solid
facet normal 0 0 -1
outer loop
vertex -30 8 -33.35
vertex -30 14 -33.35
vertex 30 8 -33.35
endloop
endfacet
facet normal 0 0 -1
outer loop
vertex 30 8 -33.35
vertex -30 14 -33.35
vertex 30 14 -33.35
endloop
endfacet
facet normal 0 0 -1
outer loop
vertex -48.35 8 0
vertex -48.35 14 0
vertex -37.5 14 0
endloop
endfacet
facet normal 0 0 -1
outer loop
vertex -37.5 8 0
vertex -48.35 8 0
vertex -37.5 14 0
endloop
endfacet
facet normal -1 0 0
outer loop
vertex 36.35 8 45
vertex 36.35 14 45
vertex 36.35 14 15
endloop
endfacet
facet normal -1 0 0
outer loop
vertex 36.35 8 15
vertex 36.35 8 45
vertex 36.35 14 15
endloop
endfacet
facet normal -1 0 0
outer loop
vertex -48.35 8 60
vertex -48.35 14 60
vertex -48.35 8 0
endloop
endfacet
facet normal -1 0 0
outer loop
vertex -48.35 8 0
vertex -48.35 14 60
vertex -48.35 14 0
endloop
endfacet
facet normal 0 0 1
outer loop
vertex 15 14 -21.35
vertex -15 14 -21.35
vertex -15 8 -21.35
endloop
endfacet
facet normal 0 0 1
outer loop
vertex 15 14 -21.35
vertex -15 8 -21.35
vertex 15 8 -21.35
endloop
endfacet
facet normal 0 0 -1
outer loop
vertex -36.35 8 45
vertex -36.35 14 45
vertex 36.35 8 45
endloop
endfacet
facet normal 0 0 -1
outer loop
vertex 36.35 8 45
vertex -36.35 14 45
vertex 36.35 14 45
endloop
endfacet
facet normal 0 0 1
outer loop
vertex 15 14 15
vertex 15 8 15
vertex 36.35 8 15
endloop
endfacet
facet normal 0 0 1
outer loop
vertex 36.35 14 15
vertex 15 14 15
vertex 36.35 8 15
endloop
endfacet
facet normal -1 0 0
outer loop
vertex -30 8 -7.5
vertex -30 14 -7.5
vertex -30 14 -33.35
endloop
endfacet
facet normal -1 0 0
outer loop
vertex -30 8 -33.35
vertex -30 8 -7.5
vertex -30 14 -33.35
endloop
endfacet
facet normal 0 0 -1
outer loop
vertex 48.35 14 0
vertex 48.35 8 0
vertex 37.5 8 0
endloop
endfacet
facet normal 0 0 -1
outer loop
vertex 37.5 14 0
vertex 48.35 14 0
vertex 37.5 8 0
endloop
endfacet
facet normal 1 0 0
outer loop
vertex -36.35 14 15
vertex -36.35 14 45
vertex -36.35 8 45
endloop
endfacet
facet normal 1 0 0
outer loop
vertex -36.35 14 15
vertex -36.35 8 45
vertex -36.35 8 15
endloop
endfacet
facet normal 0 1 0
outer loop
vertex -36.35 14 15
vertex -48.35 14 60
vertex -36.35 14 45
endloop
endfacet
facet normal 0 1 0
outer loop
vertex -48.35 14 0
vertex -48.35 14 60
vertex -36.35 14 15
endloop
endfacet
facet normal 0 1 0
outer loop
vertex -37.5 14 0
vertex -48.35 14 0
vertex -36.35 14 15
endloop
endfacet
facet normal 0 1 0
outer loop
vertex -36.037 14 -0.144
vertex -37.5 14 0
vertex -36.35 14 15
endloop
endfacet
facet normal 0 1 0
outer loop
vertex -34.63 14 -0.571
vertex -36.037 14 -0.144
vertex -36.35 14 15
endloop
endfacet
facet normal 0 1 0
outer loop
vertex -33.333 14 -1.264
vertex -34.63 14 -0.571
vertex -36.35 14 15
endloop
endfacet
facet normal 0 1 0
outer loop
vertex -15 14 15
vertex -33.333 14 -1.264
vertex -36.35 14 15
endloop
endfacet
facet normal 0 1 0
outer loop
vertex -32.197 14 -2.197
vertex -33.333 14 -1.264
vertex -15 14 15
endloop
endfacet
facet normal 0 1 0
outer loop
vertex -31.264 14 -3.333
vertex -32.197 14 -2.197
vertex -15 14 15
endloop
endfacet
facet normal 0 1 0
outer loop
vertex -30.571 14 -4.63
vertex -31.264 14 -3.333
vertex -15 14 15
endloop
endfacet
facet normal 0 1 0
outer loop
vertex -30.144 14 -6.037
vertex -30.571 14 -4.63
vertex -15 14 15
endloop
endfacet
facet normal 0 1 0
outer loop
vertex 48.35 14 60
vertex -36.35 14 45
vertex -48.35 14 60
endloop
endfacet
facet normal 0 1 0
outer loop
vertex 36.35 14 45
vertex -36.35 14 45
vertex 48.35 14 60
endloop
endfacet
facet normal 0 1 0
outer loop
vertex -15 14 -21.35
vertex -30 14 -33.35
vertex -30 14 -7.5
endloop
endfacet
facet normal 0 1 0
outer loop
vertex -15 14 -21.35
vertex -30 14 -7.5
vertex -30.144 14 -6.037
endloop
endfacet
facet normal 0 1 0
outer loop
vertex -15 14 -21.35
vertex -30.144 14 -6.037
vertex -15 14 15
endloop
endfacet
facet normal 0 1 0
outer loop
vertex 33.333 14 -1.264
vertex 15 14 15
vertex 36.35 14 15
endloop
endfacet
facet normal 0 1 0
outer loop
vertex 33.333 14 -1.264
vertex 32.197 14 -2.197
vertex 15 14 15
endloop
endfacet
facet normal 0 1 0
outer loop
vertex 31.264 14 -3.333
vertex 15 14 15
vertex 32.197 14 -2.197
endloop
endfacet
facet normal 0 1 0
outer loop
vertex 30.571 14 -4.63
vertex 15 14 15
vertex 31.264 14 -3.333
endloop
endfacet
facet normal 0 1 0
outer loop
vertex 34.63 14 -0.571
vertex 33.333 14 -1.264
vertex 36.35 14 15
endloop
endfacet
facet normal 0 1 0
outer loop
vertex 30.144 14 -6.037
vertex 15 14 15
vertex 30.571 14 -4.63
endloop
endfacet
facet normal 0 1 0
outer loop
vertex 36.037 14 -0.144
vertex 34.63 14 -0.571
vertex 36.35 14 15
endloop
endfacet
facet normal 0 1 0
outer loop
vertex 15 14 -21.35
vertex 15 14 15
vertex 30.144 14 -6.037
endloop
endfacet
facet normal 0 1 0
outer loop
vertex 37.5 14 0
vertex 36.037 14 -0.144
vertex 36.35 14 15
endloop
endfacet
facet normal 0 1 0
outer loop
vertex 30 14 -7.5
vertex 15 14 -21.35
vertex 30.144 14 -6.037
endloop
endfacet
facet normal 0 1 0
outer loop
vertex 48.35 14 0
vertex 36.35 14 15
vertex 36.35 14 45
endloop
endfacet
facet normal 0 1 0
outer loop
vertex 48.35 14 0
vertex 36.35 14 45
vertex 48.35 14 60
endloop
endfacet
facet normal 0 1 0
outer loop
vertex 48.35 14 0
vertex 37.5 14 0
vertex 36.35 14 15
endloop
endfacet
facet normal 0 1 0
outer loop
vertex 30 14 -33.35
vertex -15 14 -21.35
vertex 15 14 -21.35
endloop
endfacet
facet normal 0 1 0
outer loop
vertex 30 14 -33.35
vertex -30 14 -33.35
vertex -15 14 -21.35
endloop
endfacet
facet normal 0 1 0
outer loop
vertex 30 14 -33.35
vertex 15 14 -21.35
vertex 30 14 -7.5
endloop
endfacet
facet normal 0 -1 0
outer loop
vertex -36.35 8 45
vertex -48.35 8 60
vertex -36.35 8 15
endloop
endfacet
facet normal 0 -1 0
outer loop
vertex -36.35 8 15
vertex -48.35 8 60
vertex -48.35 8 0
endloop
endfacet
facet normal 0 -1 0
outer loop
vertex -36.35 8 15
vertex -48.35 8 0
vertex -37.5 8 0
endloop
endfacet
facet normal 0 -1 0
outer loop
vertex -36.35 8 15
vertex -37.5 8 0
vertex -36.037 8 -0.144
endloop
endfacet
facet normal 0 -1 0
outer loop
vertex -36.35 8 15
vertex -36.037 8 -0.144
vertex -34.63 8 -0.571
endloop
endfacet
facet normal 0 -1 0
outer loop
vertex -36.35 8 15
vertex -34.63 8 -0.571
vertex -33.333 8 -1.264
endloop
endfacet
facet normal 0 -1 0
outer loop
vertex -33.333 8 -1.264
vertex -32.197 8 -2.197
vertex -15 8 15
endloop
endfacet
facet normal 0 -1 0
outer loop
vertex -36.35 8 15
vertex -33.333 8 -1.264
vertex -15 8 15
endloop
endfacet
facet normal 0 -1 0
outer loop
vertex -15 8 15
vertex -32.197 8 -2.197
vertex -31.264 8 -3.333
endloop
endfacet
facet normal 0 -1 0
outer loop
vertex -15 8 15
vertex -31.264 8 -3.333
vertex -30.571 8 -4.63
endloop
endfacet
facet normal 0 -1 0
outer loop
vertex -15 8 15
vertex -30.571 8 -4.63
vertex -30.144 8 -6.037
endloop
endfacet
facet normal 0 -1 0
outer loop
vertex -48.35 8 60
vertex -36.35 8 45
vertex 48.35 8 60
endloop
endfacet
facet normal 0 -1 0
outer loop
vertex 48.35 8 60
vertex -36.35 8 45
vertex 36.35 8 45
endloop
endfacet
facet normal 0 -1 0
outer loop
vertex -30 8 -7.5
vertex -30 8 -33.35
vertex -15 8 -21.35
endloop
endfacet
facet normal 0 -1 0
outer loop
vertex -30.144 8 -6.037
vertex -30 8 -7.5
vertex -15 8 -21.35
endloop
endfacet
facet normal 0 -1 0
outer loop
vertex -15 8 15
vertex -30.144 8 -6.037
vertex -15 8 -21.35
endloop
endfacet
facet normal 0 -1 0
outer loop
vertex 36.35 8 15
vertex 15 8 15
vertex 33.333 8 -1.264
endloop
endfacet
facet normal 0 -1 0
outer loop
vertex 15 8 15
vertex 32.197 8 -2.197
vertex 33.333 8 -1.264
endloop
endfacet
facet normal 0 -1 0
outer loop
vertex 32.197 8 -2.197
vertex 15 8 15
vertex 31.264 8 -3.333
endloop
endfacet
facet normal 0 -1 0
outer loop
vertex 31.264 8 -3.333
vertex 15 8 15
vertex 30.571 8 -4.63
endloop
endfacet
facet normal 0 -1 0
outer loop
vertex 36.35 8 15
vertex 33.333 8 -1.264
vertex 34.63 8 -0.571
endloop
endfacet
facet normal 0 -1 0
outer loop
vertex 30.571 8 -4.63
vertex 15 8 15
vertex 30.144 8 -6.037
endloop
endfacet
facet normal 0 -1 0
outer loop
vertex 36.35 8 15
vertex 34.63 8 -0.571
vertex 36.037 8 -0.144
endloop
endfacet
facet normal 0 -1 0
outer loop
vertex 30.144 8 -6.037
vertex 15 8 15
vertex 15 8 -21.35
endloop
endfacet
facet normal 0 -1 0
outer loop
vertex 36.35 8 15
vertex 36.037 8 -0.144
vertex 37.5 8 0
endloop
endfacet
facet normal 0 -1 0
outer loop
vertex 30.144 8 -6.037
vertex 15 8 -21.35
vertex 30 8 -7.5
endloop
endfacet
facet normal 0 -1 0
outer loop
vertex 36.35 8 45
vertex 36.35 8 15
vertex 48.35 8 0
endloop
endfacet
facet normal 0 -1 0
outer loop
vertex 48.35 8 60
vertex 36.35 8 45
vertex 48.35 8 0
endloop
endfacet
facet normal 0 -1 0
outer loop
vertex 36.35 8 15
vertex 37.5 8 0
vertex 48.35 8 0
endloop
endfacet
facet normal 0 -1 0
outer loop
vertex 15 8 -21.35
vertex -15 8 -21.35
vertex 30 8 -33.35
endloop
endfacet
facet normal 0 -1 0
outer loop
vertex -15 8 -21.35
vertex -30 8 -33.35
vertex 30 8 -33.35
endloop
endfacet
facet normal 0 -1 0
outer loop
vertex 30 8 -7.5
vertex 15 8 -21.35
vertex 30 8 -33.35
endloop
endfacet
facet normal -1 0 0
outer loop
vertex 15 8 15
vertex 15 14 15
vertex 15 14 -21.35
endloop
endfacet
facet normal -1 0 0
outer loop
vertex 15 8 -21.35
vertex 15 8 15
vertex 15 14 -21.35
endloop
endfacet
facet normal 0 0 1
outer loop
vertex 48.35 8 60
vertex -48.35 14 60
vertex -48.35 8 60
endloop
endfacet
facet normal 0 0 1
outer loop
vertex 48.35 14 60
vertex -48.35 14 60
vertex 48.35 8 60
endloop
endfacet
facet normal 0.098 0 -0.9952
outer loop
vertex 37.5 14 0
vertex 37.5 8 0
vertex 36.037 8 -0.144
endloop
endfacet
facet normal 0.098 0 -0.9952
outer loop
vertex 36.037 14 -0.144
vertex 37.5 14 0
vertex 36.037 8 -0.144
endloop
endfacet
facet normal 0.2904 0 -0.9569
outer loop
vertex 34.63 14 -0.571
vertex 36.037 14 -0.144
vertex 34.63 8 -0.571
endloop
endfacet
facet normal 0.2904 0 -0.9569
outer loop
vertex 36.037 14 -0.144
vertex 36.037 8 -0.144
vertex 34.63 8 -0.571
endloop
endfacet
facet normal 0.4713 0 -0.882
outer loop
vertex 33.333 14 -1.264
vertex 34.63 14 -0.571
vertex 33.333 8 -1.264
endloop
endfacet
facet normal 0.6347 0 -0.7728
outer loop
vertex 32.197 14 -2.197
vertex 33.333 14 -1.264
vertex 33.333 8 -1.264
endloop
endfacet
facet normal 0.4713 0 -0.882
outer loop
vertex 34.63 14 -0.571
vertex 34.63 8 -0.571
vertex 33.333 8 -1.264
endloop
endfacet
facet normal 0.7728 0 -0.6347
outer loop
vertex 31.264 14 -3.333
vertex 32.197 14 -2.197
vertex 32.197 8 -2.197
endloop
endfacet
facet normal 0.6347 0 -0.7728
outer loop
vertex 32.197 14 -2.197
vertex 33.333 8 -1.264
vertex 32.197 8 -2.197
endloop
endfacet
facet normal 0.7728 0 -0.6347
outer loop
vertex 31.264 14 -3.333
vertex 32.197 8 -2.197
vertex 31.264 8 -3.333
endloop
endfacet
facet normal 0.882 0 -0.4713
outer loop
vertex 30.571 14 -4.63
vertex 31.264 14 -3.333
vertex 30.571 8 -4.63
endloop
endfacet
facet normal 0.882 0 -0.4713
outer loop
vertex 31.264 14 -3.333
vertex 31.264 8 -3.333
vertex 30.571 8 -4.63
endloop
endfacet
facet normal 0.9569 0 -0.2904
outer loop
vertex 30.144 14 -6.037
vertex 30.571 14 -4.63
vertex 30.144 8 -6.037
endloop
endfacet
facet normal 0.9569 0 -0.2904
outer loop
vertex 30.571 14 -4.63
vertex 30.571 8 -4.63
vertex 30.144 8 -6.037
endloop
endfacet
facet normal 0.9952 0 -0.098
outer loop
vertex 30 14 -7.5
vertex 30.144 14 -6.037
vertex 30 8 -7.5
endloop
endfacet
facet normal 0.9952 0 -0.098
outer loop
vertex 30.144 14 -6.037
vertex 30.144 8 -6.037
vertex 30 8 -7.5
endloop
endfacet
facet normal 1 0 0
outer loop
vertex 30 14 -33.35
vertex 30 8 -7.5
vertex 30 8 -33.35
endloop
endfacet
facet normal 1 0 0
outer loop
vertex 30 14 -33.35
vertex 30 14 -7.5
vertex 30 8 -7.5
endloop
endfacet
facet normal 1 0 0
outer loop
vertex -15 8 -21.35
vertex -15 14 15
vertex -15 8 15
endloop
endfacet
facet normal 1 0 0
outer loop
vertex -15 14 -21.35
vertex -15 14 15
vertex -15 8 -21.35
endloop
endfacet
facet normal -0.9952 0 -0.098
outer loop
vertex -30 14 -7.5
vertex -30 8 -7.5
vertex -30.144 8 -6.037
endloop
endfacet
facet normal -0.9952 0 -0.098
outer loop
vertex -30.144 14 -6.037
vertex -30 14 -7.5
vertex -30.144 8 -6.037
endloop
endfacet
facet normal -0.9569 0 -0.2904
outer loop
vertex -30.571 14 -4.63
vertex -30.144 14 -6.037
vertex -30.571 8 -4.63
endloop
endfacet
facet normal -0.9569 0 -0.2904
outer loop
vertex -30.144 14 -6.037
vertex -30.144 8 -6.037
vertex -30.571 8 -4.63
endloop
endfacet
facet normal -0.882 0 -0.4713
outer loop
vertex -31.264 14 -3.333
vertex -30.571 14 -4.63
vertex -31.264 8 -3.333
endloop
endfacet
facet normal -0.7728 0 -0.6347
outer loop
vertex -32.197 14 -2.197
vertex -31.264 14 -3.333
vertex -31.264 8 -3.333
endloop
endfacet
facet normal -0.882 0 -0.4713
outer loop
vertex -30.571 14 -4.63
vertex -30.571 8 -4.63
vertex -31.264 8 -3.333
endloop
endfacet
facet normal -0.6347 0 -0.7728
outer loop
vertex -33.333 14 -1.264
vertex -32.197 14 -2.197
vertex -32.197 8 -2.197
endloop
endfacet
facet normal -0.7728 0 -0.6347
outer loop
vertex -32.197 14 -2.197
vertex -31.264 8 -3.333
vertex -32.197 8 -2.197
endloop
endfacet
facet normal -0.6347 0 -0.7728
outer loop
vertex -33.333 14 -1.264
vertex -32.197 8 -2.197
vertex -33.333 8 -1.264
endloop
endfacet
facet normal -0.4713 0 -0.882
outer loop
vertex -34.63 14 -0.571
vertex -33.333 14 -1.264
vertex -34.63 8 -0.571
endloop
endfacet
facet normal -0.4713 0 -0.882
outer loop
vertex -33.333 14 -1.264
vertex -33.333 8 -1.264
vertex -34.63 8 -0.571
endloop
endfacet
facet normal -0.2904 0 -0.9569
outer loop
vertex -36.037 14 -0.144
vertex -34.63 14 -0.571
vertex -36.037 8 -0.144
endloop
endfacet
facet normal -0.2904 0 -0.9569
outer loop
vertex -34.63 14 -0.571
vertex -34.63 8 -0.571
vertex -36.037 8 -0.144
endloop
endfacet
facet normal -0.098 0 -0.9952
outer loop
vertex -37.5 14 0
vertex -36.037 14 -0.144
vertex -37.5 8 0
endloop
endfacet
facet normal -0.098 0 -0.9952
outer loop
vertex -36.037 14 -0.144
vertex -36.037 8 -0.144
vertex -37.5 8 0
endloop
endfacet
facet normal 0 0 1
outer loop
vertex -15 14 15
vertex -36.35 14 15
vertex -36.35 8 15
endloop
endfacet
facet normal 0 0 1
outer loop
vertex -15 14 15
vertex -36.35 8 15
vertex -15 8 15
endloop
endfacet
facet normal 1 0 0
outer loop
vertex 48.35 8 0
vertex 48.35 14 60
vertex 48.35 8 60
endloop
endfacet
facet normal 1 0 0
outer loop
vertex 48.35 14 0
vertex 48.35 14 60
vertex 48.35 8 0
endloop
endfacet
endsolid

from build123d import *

# Parameters (mm, degrees)
CROQUIS1_W                = 30
CROQUIS1_H                = 30
SALIENTE_EXTRUIR1_DEPTH   = 3
CROQUIS2_W                = 15
CROQUIS2_H                = 30
SALIENTE_EXTRUIR3_DEPTH   = 3
SALIENTE_EXTRUIR3_2_DEPTH = 3
CROQUIS3_W                = 30
CROQUIS3_H                = 30
SALIENTE_EXTRUIR4_DEPTH   = 3
SALIENTE_EXTRUIR5_DEPTH   = 3
CORTAR_EXTRUIR1_DEPTH     = 6
SALIENTE_EXTRUIR8_DEPTH   = 11
CROQUIS7_W                = 30
CROQUIS7_H                = 3.175
CORTAR_EXTRUIR3_DEPTH     = 18.542
CROQUIS9_W                = 60
CROQUIS9_H                = 0.175
SALIENTE_EXTRUIR9_DEPTH   = 11
CROQUIS10_W               = 90
CROQUIS10_H               = 5
CORTAR_EXTRUIR5_DEPTH     = 93
CROQUIS11_W               = 30
CROQUIS11_H               = 3.175
SALIENTE_EXTRUIR10_DEPTH  = 11
CROQUIS12_W               = 60
CROQUIS12_H               = 0.175
CORTAR_EXTRUIR6_DEPTH     = 11
CROQUIS14_W               = 30
CROQUIS14_H               = 6.35
CORTAR_EXTRUIR8_DEPTH     = 19.812
CROQUIS15_W               = 60
CROQUIS15_H               = 6.315381445
SALIENTE_EXTRUIR14_DEPTH  = 6
CROQUIS16_W               = 6.35
CROQUIS16_H               = 30
CORTAR_EXTRUIR9_DEPTH     = 10
CROQUIS17_W               = 3.35
CROQUIS17_H               = 60
SALIENTE_EXTRUIR15_DEPTH  = 6


with BuildPart() as part:
    # Croquis1 → Saliente-Extruir1 (new body)
    with BuildSketch(Plane(origin=(0, 0, 0), x_dir=(1, 0, 0), z_dir=(0, 1, 0))):
        Rectangle(CROQUIS1_W, CROQUIS1_H)
    extrude(amount=SALIENTE_EXTRUIR1_DEPTH)



with BuildPart() as body_2:
    # Croquis2 → Saliente-Extruir3 (new body)
    with BuildSketch(Plane(origin=(0, 3, 0), x_dir=(1, 0, 0), z_dir=(0, 1, 0))):
        with Locations((-22.5, -30)):
            Rectangle(CROQUIS2_W, CROQUIS2_H)
    extrude(amount=-SALIENTE_EXTRUIR3_DEPTH)


with BuildPart() as body_3:
    # Croquis2 → Saliente-Extruir3 2 (new body)
    with BuildSketch(Plane(origin=(0, 3, 0), x_dir=(1, 0, 0), z_dir=(0, 1, 0))):
        with Locations((22.5, -30)):
            Rectangle(CROQUIS2_W, CROQUIS2_H)
    extrude(amount=-SALIENTE_EXTRUIR3_2_DEPTH)


with BuildPart() as part_1:
    add(part.part)

    add(body_2.part)  # Saliente-Extruir4 merges body 2

    add(body_3.part)  # Saliente-Extruir4 merges body 3
    # Croquis3 → Saliente-Extruir4 (add)
    with BuildSketch(Plane(origin=(0, 3, 0), x_dir=(1, 0, 0), z_dir=(0, 1, 0))):
        with Locations((0, -30)):
            Rectangle(CROQUIS3_W, CROQUIS3_H)
    extrude(amount=-SALIENTE_EXTRUIR4_DEPTH)

    # Croquis4 → Saliente-Extruir5 (add)
    with BuildSketch(Plane(origin=(0, 3, 0), x_dir=(1, 0, 0), z_dir=(0, 1, 0))):
        Polygon((-30, 0), (-45, 0), (-45, -60), (45, -60), (45, 0), (30, 0), (30, 30), (-30, 30), align=None)
    extrude(amount=SALIENTE_EXTRUIR5_DEPTH)

    # Croquis5 → Cortar-Extruir1 (cut)
    with BuildSketch(Plane(origin=(0, 0, 0), x_dir=(-1, 0, 0), z_dir=(0, -1, 0))):
        Polygon((30, -45), (30, -15), (15, -15), (15, 15), (-15, 15), (-15, -15), (-30, -15), (-30, -45), align=None)
    extrude(amount=-CORTAR_EXTRUIR1_DEPTH, mode=Mode.SUBTRACT)

    # Croquis6 → Saliente-Extruir8 (add)
    with BuildSketch(Plane(origin=(0, 3, 0), x_dir=(-1, 0, 0), z_dir=(0, -1, 0))):
        with BuildLine():
            Line((37.5, 0), (45, 0))
            Line((45, 0), (45, -60))
            Line((45, -60), (-45, -60))
            Line((-45, -60), (-45, 0))
            Line((-45, 0), (-37.5, 0))
            ThreePointArc((-37.5, 0), (-32.196699141, 2.196699141), (-30, 7.5))
            Line((-30, 7.5), (-30, 30))
            Line((-30, 30), (30, 30))
            Line((30, 30), (30, 7.5))
            ThreePointArc((30, 7.5), (32.196699141, 2.196699141), (37.5, 0))
        make_face()
        Polygon((15, 15), (15, -15), (30, -15), (30, -45), (-30, -45), (-30, -15), (-15, -15), (-15, 15), align=None, mode=Mode.SUBTRACT)
    extrude(amount=-SALIENTE_EXTRUIR8_DEPTH)

    # Croquis7 → Cortar-Extruir3 (cut)
    with BuildSketch(Plane(origin=(0, 14, 0), x_dir=(1, 0, 0), z_dir=(0, 1, 0))):
        with Locations((0, 16.5875)):
            Rectangle(CROQUIS7_W, CROQUIS7_H)
    extrude(amount=-CORTAR_EXTRUIR3_DEPTH, mode=Mode.SUBTRACT)

    # Croquis9 → Saliente-Extruir9 (add)
    with BuildSketch(Plane(origin=(0, 14, 0), x_dir=(1, 0, 0), z_dir=(0, 1, 0))):
        with Locations((0, 30.0875)):
            Rectangle(CROQUIS9_W, CROQUIS9_H)
    extrude(amount=-SALIENTE_EXTRUIR9_DEPTH)

    # Croquis10 → Cortar-Extruir5 (cut)
    with BuildSketch(Plane.XY.offset(60)):
        with Locations((0, 5.5)):
            Rectangle(CROQUIS10_W, CROQUIS10_H)
    extrude(amount=-CORTAR_EXTRUIR5_DEPTH, mode=Mode.SUBTRACT)

    # Croquis11 → Saliente-Extruir10 (add)
    with BuildSketch(Plane(origin=(0, 14, 0), x_dir=(1, 0, 0), z_dir=(0, 1, 0))):
        with Locations((0, 16.5875)):
            Rectangle(CROQUIS11_W, CROQUIS11_H)
    extrude(amount=-SALIENTE_EXTRUIR10_DEPTH)

    # Croquis12 → Cortar-Extruir6 (cut)
    with BuildSketch(Plane(origin=(0, 14, 0), x_dir=(1, 0, 0), z_dir=(0, 1, 0))):
        with Locations((0, 30.0875)):
            Rectangle(CROQUIS12_W, CROQUIS12_H)
    extrude(amount=-CORTAR_EXTRUIR6_DEPTH, mode=Mode.SUBTRACT)

    # Croquis14 → Cortar-Extruir8 (cut)
    with BuildSketch(Plane(origin=(0, 14, 0), x_dir=(1, 0, 0), z_dir=(0, 1, 0))):
        with Locations((0, 18.175)):
            Rectangle(CROQUIS14_W, CROQUIS14_H)
    extrude(amount=-CORTAR_EXTRUIR8_DEPTH, mode=Mode.SUBTRACT)

    # Croquis15 → Saliente-Extruir14 (add)
    with BuildSketch(Plane(origin=(0, 14, 0), x_dir=(1, 0, 0), z_dir=(0, 1, 0))):
        with Locations((0, 30.192309278)):
            Rectangle(CROQUIS15_W, CROQUIS15_H)
    extrude(amount=-SALIENTE_EXTRUIR14_DEPTH)

    # Croquis16 → Cortar-Extruir9 (cut)
    with BuildSketch(Plane(origin=(0, 14, 0), x_dir=(1, 0, 0), z_dir=(0, 1, 0))):
        with Locations((-33.175, -30)):
            Rectangle(CROQUIS16_W, CROQUIS16_H)
        with Locations((33.175, -30)):
            Rectangle(CROQUIS16_W, CROQUIS16_H)
    extrude(amount=-CORTAR_EXTRUIR9_DEPTH, mode=Mode.SUBTRACT)

    # Croquis17 → Saliente-Extruir15 (add)
    with BuildSketch(Plane(origin=(0, 14, 0), x_dir=(1, 0, 0), z_dir=(0, 1, 0))):
        with Locations((-46.675, -30)):
            Rectangle(CROQUIS17_W, CROQUIS17_H)
        with Locations((46.675, -30)):
            Rectangle(CROQUIS17_W, CROQUIS17_H)
    extrude(amount=-SALIENTE_EXTRUIR15_DEPTH)


solid = part_1.part
